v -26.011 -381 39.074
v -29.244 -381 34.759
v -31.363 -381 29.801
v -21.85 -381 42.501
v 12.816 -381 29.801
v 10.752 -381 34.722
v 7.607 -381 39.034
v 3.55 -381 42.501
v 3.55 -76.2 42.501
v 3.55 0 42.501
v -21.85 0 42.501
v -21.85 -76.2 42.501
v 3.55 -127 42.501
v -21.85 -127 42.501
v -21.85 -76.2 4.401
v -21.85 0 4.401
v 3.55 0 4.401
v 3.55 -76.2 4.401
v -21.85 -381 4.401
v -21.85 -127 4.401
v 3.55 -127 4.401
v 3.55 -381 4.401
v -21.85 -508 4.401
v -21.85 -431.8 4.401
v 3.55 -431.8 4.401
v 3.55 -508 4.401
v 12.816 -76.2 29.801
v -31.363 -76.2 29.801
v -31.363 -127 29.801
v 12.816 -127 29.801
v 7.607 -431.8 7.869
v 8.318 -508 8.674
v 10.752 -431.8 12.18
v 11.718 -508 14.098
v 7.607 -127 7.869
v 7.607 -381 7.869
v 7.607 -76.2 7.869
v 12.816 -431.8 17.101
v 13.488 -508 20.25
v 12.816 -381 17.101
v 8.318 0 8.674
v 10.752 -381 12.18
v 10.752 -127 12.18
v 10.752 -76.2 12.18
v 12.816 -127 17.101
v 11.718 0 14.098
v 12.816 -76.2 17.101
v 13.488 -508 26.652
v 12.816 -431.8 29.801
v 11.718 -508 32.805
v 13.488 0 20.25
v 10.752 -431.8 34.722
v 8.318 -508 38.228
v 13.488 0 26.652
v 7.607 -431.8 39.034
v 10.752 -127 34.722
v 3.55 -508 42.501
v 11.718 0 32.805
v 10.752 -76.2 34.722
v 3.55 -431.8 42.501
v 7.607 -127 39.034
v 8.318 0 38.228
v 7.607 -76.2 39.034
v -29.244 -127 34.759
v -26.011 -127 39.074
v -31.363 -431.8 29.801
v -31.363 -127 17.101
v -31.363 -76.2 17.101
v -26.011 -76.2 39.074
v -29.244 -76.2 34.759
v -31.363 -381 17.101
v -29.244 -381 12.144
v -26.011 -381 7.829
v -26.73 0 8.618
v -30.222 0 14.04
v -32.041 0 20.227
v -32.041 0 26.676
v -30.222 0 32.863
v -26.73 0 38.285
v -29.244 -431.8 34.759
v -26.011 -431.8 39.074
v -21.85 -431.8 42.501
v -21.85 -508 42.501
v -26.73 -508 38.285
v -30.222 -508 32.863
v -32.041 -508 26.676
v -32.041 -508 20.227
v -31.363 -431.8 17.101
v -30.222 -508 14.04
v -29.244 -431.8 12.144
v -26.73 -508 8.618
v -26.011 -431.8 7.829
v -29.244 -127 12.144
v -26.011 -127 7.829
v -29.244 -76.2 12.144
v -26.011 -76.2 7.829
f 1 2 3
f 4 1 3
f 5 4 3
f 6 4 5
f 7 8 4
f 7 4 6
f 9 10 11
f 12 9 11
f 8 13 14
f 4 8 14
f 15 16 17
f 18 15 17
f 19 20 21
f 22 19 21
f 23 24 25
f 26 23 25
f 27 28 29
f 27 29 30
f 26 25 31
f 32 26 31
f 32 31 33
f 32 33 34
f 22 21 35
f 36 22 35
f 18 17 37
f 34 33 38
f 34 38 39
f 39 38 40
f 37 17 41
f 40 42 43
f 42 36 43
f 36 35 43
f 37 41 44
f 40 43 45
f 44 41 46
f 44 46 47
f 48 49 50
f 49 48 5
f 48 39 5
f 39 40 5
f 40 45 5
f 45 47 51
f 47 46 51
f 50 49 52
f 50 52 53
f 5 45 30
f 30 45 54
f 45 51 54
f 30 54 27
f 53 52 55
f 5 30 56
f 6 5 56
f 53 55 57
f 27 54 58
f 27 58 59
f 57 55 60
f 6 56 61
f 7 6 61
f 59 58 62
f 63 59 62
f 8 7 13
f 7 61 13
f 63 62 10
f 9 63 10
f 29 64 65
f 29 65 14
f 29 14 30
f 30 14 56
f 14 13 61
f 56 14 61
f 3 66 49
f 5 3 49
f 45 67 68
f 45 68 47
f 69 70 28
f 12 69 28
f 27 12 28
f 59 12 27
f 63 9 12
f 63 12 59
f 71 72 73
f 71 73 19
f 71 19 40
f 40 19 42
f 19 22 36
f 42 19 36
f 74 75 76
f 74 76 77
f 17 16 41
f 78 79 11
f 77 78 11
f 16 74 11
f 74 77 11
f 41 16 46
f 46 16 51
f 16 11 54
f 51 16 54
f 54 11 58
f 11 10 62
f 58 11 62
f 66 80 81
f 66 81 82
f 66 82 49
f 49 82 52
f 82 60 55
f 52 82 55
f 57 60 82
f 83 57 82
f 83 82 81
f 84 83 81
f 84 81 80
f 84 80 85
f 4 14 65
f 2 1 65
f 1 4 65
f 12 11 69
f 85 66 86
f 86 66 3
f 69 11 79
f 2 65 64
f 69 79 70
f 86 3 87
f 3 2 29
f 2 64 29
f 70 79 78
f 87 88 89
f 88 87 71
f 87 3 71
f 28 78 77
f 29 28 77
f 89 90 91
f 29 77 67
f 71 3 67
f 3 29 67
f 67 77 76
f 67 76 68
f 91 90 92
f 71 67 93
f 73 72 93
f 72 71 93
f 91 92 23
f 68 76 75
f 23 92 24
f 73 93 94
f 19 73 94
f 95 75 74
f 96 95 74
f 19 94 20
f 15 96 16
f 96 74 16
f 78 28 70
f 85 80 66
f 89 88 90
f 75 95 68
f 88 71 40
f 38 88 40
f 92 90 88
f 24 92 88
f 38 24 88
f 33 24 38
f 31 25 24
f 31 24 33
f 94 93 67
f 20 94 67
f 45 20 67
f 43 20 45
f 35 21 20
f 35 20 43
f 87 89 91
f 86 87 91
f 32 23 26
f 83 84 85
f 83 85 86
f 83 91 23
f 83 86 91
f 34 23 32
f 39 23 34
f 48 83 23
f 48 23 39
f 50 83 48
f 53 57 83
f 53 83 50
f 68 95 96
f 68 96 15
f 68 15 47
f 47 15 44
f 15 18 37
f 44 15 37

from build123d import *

# Parameters (mm, degrees)
F1_DEPTH = 508
F2_W     = 80.340108
F2_H     = 50.8
F2_W_2   = 82.870346
F3_DEPTH = 12.7
F4_W     = 83.715823
F4_H     = 50.8
F4_W_2   = 80.30174
F5_DEPTH = 12.7


with BuildPart() as f1:
    # F0 (on Front) → F1 (new body)
    with BuildSketch(Plane.XZ):
        with BuildLine():
            Line((3.550242, 42.501207), (-21.849758, 42.501207))
            ThreePointArc((-21.849758, 42.501207), (-32.272509, 23.451207), (-21.849758, 4.401207))
            Line((-21.849758, 4.401207), (3.550242, 4.401207))
            ThreePointArc((3.550242, 4.401207), (13.712078, 23.451207), (3.550242, 42.501207))
        make_face()
    extrude(amount=F1_DEPTH)

    # F2 (on face) → F3 (cut)
    with BuildSketch(Plane.XY.offset(42.501207)):
        with Locations((-9.149758, -406.4)):
            Rectangle(F2_W, F2_H)
        with Locations((-9.149758, -101.6)):
            Rectangle(F2_W_2, F2_H)
    extrude(amount=-F3_DEPTH, mode=Mode.SUBTRACT)

    # F4 (on face) → F5 (cut)
    with BuildSketch(Plane(origin=(0, 0, 4.401207), x_dir=(1, 0, 0), z_dir=(0, 0, -1))):
        with Locations((-9.149757, 101.6)):
            Rectangle(F4_W, F4_H)
        with Locations((-9.149758, 406.4)):
            Rectangle(F4_W_2, F4_H)
    extrude(amount=-F5_DEPTH, mode=Mode.SUBTRACT)


solid = f1.part
